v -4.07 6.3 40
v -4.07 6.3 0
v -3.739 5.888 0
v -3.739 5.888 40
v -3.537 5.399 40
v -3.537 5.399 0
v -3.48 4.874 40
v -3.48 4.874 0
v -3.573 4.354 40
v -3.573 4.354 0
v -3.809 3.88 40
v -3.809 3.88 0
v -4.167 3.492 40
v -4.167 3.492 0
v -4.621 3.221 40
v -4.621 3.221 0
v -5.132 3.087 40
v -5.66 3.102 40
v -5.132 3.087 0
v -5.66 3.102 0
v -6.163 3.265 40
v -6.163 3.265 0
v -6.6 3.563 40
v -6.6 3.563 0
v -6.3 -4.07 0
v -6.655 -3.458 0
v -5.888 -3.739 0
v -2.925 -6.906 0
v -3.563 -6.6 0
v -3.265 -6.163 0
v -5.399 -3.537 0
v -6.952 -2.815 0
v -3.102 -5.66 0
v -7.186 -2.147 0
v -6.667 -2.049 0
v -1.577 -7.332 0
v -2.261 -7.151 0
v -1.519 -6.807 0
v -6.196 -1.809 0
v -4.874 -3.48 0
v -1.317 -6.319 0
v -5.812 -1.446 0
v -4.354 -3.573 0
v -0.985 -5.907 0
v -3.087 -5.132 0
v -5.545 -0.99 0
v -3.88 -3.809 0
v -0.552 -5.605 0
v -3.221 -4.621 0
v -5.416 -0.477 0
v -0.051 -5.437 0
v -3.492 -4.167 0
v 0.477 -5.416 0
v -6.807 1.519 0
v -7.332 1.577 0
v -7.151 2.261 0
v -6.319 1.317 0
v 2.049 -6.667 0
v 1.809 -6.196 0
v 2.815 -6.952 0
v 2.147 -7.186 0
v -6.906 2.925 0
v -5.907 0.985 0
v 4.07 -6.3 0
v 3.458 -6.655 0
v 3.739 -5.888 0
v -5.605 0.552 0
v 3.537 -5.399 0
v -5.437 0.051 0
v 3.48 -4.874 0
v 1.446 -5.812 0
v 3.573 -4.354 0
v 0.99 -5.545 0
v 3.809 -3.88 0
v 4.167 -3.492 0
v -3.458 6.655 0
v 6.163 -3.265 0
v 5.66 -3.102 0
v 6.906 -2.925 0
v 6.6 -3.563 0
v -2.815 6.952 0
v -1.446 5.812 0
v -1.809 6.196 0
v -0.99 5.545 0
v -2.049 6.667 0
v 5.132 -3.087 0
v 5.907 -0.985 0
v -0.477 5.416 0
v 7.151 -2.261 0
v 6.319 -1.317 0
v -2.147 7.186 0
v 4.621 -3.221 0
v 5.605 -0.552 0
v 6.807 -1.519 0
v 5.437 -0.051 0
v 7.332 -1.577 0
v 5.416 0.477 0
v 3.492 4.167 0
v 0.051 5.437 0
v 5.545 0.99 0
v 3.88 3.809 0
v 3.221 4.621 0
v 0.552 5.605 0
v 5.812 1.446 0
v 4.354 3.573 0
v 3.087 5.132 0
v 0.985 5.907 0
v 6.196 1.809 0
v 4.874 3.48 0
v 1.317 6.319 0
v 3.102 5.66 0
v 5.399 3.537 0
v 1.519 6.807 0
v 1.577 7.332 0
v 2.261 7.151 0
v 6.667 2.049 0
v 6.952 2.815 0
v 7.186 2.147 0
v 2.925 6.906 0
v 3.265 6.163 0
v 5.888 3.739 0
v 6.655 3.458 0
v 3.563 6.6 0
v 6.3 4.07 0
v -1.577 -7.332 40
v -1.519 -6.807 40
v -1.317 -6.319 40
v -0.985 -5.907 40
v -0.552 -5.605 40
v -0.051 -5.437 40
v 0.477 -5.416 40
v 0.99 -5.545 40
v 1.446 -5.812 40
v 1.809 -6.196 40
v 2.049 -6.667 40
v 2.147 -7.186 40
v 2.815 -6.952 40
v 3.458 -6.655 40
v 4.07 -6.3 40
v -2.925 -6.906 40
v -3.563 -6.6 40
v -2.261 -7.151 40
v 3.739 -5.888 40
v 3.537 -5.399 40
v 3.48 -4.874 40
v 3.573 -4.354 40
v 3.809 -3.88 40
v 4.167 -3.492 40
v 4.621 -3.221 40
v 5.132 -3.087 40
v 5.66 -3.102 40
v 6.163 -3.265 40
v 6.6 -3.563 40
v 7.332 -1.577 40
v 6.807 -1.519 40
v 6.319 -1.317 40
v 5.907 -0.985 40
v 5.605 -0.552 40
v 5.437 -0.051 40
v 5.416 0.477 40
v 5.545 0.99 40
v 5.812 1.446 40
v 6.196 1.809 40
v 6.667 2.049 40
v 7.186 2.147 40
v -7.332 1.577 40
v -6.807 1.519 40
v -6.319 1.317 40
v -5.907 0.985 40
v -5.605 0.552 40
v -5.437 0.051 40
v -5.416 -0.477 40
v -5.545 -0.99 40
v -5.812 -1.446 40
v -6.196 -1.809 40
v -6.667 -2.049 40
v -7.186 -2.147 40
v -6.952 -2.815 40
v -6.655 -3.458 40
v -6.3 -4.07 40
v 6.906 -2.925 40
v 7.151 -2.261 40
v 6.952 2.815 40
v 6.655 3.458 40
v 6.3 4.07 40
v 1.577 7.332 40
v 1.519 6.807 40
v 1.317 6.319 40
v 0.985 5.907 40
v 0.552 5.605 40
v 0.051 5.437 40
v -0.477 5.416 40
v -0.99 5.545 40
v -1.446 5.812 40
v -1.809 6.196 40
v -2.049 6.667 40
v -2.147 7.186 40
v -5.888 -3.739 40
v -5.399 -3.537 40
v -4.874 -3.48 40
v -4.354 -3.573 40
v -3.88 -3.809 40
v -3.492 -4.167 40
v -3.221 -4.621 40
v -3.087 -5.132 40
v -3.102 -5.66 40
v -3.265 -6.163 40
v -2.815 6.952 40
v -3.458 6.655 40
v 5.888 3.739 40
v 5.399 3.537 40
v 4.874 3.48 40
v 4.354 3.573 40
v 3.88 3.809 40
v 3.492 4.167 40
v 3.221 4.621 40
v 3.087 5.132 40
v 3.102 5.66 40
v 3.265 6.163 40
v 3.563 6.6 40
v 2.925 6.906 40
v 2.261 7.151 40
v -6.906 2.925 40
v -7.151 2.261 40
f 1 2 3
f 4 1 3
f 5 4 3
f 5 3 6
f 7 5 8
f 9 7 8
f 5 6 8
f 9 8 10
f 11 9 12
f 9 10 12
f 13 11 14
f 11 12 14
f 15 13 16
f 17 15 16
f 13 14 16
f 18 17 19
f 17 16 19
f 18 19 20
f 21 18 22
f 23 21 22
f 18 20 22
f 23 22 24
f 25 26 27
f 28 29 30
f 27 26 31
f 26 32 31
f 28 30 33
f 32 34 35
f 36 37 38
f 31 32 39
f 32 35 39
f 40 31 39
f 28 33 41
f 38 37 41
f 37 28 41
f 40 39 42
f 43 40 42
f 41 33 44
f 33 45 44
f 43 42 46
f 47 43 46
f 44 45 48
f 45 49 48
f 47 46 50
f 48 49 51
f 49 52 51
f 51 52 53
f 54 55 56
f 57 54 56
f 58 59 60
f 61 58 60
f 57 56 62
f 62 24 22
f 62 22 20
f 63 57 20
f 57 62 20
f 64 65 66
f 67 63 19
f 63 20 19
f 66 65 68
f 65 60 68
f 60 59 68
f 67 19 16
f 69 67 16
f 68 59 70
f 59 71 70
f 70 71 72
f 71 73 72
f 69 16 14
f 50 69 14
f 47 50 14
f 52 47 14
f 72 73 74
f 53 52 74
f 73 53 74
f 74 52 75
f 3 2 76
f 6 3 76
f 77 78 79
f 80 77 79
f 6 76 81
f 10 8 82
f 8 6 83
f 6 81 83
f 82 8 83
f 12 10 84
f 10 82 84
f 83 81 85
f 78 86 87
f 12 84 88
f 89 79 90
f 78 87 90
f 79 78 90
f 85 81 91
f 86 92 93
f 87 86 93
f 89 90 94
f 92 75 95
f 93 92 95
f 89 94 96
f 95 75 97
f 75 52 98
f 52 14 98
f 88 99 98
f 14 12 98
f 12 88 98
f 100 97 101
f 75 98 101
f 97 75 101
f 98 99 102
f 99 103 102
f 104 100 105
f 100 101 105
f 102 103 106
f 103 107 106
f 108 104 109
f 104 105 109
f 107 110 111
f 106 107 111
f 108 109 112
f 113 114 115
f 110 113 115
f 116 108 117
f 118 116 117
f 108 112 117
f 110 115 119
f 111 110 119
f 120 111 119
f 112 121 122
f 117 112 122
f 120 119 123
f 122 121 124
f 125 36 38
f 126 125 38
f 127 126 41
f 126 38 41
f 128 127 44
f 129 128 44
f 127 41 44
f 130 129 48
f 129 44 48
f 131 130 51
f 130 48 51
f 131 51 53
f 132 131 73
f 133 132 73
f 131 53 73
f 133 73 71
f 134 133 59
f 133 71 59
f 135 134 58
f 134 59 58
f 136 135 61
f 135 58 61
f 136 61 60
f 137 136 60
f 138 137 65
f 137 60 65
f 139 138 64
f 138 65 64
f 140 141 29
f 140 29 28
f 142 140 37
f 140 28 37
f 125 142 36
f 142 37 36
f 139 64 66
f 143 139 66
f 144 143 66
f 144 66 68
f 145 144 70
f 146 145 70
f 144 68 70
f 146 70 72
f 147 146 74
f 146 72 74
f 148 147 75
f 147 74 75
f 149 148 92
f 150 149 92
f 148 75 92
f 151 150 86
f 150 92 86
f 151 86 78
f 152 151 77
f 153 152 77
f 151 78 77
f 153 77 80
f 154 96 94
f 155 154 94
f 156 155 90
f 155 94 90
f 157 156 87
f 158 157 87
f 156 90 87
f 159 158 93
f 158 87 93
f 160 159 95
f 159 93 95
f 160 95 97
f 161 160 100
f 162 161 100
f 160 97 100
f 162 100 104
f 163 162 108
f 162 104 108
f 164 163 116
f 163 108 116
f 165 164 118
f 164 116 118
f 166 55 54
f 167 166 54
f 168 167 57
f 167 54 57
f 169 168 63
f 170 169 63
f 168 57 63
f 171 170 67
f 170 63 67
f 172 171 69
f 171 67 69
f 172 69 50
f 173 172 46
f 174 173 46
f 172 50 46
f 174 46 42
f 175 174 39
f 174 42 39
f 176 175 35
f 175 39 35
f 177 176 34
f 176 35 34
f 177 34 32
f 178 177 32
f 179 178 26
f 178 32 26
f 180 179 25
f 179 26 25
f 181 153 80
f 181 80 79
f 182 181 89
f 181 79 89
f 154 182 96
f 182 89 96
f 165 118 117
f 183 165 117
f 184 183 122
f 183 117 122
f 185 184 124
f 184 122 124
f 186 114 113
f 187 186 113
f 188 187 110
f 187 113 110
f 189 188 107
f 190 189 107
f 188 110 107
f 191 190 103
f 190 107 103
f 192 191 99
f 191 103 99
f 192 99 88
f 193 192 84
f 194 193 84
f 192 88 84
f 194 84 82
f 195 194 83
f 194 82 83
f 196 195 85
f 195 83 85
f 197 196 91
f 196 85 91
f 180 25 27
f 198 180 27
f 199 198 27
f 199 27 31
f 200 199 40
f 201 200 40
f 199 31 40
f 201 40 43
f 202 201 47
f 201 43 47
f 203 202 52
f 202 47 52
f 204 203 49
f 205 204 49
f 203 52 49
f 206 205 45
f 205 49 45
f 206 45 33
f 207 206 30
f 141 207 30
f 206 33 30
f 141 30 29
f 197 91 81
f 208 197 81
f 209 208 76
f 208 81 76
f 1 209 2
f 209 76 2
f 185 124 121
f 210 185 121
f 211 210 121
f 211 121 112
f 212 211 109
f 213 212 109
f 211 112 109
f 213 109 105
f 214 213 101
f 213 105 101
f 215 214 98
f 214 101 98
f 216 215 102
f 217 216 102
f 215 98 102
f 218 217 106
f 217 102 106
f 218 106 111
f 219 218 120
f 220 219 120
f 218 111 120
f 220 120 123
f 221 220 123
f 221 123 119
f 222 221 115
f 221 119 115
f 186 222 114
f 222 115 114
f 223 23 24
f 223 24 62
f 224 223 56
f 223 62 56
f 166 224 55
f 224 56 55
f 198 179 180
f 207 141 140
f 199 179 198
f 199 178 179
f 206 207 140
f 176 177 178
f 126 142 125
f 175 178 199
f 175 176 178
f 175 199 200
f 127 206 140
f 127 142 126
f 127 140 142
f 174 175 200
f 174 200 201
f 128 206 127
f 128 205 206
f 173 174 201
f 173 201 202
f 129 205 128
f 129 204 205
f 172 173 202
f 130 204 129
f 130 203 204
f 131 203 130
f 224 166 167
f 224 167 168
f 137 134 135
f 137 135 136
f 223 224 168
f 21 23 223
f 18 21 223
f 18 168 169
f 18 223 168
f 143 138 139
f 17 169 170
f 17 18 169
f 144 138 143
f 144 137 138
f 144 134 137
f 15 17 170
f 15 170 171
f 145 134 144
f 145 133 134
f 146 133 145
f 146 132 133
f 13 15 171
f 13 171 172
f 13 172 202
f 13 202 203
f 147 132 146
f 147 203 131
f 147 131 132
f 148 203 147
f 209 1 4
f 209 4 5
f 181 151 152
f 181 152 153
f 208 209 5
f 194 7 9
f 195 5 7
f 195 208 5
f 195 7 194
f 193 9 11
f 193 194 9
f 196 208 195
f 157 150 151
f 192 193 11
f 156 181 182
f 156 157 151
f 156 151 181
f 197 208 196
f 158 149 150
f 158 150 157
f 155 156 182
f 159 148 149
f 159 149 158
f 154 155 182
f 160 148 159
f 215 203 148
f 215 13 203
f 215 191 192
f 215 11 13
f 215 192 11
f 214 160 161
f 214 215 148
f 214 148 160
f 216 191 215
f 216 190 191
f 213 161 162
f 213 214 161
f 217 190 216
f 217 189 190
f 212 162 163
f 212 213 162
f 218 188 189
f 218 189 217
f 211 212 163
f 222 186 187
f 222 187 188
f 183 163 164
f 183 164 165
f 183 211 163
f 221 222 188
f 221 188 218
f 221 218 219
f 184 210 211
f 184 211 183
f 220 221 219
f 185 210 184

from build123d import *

# Parameters (mm, degrees)
F1_DEPTH = 40


with BuildPart() as f1:
    # F0 (on Top) → F1 (new body)
    with BuildSketch(Plane.XY):
        with BuildLine():
            ThreePointArc((7.3323928732, -1.5767101044), (5.4077667076, 0.2125573054), (7.1860144522, 2.1473696218))
            ThreePointArc((7.1860144522, 2.1473696218), (6.8110241928, 3.1400556437), (6.2996871297, 4.0698823162))
            ThreePointArc((6.2996871297, 4.0698823162), (3.673567798, 3.974169222), (3.5628599276, 6.5996991701))
            ThreePointArc((3.5628599276, 6.5996991701), (2.5957667546, 7.0364760325), (1.5767101044, 7.3323928732))
            ThreePointArc((1.5767101044, 7.3323928732), (-0.2125573054, 5.4077667076), (-2.1473696218, 7.1860144522))
            ThreePointArc((-2.1473696218, 7.1860144522), (-3.1400556437, 6.8110241928), (-4.0698823162, 6.2996871297))
            ThreePointArc((-4.0698823162, 6.2996871297), (-3.974169222, 3.673567798), (-6.5996991701, 3.5628599276))
            ThreePointArc((-6.5996991701, 3.5628599276), (-7.0364760325, 2.5957667546), (-7.3323928732, 1.5767101044))
            ThreePointArc((-7.3323928732, 1.5767101044), (-5.4077667076, -0.2125573054), (-7.1860144522, -2.1473696218))
            ThreePointArc((-7.1860144522, -2.1473696218), (-6.8110241928, -3.1400556437), (-6.2996871297, -4.0698823162))
            ThreePointArc((-6.2996871297, -4.0698823162), (-3.673567798, -3.974169222), (-3.5628599276, -6.5996991701))
            ThreePointArc((-3.5628599276, -6.5996991701), (-2.5957667546, -7.0364760325), (-1.5767101044, -7.3323928732))
            ThreePointArc((-1.5767101044, -7.3323928732), (0.2125573054, -5.4077667076), (2.1473696218, -7.1860144522))
            ThreePointArc((2.1473696218, -7.1860144522), (3.1400556437, -6.8110241928), (4.0698823162, -6.2996871297))
            ThreePointArc((4.0698823162, -6.2996871297), (3.974169222, -3.673567798), (6.5996991701, -3.5628599276))
            ThreePointArc((6.5996991701, -3.5628599276), (7.0364760325, -2.5957667546), (7.3323928732, -1.5767101044))
        make_face()
    extrude(amount=F1_DEPTH)


solid = f1.part
